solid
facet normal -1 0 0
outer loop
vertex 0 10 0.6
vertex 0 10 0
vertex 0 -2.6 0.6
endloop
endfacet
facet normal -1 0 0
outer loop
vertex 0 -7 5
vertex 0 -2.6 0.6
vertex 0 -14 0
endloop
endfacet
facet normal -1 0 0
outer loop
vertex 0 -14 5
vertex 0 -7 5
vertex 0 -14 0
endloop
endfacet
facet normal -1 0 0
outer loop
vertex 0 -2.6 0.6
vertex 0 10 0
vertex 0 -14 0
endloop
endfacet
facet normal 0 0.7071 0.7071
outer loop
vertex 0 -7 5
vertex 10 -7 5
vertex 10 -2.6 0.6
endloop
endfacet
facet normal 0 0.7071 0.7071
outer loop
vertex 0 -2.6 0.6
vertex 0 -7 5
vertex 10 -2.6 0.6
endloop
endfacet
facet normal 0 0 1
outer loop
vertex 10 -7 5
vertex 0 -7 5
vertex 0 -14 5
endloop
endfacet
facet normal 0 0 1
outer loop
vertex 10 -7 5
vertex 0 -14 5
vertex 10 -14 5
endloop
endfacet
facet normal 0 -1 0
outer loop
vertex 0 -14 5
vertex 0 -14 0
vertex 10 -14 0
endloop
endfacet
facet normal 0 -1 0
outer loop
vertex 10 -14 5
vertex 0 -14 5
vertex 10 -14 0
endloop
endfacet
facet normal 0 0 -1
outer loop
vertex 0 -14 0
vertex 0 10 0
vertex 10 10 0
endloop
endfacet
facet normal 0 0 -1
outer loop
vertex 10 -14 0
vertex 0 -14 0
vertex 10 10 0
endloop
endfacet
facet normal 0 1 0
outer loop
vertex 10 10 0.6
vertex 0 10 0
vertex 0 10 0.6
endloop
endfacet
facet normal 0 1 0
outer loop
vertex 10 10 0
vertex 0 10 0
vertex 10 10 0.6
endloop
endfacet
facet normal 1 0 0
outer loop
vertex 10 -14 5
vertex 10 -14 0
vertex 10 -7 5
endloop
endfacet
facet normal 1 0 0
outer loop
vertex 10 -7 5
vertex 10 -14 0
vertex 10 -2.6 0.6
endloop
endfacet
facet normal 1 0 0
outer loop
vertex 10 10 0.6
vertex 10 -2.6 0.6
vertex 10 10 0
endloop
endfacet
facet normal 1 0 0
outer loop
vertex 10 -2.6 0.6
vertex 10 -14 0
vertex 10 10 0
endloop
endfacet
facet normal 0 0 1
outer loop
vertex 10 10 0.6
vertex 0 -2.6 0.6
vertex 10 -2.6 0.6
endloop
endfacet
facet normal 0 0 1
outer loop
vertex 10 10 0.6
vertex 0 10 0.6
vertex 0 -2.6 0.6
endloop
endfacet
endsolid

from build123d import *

# Parameters (mm, degrees)
F0_W        = 10
F0_H        = 10
F0_H_2      = 2
F0_H_3      = 12
F1_DEPTH    = 0.6
F2_DEPTH    = 5
F3_T4_DEPTH = 35.7168298797


# Not quite as in the source:
# - a fillet or chamfer that OpenCascade refuses, or shapes differently, is made with other operations: its cross-section is extruded or revolved along the edge and cut away or added


with BuildPart() as f1:
    # F0 (on Top) → F1 (new body)
    with BuildSketch(Plane.XY):
        with Locations((5, 5)):
            Rectangle(F0_W, F0_H)
        with Locations((5, -1)):
            Rectangle(F0_W, F0_H_2)
        with Locations((5, -8)):
            Rectangle(F0_W, F0_H_3)
    extrude(amount=F1_DEPTH)

    # F0 (on Top) → F2 (join)
    with BuildSketch(Plane.XY):
        with Locations((5, -8)):
            Rectangle(F0_W, F0_H_3)
    extrude(amount=F2_DEPTH)

    # F3: chamfer of 5 on 1 edges, made by hand


with BuildPart() as f3_tool2:
    # F3_s3 → F3_t4 (new body)
    with BuildSketch(Plane.YZ.offset(22.8584149398)):
        Polygon((-7, 5), (-2, 0), (-2, 5), align=None)
    extrude(amount=-F3_T4_DEPTH)

    split(bisect_by=Plane.XY.offset(0.6), keep=Keep.TOP)


with BuildPart() as f1_1:
    add(f1.part)

    # F3_t1: cut F3_tool2
    add(f3_tool2.part, mode=Mode.SUBTRACT)


solid = f1_1.part
